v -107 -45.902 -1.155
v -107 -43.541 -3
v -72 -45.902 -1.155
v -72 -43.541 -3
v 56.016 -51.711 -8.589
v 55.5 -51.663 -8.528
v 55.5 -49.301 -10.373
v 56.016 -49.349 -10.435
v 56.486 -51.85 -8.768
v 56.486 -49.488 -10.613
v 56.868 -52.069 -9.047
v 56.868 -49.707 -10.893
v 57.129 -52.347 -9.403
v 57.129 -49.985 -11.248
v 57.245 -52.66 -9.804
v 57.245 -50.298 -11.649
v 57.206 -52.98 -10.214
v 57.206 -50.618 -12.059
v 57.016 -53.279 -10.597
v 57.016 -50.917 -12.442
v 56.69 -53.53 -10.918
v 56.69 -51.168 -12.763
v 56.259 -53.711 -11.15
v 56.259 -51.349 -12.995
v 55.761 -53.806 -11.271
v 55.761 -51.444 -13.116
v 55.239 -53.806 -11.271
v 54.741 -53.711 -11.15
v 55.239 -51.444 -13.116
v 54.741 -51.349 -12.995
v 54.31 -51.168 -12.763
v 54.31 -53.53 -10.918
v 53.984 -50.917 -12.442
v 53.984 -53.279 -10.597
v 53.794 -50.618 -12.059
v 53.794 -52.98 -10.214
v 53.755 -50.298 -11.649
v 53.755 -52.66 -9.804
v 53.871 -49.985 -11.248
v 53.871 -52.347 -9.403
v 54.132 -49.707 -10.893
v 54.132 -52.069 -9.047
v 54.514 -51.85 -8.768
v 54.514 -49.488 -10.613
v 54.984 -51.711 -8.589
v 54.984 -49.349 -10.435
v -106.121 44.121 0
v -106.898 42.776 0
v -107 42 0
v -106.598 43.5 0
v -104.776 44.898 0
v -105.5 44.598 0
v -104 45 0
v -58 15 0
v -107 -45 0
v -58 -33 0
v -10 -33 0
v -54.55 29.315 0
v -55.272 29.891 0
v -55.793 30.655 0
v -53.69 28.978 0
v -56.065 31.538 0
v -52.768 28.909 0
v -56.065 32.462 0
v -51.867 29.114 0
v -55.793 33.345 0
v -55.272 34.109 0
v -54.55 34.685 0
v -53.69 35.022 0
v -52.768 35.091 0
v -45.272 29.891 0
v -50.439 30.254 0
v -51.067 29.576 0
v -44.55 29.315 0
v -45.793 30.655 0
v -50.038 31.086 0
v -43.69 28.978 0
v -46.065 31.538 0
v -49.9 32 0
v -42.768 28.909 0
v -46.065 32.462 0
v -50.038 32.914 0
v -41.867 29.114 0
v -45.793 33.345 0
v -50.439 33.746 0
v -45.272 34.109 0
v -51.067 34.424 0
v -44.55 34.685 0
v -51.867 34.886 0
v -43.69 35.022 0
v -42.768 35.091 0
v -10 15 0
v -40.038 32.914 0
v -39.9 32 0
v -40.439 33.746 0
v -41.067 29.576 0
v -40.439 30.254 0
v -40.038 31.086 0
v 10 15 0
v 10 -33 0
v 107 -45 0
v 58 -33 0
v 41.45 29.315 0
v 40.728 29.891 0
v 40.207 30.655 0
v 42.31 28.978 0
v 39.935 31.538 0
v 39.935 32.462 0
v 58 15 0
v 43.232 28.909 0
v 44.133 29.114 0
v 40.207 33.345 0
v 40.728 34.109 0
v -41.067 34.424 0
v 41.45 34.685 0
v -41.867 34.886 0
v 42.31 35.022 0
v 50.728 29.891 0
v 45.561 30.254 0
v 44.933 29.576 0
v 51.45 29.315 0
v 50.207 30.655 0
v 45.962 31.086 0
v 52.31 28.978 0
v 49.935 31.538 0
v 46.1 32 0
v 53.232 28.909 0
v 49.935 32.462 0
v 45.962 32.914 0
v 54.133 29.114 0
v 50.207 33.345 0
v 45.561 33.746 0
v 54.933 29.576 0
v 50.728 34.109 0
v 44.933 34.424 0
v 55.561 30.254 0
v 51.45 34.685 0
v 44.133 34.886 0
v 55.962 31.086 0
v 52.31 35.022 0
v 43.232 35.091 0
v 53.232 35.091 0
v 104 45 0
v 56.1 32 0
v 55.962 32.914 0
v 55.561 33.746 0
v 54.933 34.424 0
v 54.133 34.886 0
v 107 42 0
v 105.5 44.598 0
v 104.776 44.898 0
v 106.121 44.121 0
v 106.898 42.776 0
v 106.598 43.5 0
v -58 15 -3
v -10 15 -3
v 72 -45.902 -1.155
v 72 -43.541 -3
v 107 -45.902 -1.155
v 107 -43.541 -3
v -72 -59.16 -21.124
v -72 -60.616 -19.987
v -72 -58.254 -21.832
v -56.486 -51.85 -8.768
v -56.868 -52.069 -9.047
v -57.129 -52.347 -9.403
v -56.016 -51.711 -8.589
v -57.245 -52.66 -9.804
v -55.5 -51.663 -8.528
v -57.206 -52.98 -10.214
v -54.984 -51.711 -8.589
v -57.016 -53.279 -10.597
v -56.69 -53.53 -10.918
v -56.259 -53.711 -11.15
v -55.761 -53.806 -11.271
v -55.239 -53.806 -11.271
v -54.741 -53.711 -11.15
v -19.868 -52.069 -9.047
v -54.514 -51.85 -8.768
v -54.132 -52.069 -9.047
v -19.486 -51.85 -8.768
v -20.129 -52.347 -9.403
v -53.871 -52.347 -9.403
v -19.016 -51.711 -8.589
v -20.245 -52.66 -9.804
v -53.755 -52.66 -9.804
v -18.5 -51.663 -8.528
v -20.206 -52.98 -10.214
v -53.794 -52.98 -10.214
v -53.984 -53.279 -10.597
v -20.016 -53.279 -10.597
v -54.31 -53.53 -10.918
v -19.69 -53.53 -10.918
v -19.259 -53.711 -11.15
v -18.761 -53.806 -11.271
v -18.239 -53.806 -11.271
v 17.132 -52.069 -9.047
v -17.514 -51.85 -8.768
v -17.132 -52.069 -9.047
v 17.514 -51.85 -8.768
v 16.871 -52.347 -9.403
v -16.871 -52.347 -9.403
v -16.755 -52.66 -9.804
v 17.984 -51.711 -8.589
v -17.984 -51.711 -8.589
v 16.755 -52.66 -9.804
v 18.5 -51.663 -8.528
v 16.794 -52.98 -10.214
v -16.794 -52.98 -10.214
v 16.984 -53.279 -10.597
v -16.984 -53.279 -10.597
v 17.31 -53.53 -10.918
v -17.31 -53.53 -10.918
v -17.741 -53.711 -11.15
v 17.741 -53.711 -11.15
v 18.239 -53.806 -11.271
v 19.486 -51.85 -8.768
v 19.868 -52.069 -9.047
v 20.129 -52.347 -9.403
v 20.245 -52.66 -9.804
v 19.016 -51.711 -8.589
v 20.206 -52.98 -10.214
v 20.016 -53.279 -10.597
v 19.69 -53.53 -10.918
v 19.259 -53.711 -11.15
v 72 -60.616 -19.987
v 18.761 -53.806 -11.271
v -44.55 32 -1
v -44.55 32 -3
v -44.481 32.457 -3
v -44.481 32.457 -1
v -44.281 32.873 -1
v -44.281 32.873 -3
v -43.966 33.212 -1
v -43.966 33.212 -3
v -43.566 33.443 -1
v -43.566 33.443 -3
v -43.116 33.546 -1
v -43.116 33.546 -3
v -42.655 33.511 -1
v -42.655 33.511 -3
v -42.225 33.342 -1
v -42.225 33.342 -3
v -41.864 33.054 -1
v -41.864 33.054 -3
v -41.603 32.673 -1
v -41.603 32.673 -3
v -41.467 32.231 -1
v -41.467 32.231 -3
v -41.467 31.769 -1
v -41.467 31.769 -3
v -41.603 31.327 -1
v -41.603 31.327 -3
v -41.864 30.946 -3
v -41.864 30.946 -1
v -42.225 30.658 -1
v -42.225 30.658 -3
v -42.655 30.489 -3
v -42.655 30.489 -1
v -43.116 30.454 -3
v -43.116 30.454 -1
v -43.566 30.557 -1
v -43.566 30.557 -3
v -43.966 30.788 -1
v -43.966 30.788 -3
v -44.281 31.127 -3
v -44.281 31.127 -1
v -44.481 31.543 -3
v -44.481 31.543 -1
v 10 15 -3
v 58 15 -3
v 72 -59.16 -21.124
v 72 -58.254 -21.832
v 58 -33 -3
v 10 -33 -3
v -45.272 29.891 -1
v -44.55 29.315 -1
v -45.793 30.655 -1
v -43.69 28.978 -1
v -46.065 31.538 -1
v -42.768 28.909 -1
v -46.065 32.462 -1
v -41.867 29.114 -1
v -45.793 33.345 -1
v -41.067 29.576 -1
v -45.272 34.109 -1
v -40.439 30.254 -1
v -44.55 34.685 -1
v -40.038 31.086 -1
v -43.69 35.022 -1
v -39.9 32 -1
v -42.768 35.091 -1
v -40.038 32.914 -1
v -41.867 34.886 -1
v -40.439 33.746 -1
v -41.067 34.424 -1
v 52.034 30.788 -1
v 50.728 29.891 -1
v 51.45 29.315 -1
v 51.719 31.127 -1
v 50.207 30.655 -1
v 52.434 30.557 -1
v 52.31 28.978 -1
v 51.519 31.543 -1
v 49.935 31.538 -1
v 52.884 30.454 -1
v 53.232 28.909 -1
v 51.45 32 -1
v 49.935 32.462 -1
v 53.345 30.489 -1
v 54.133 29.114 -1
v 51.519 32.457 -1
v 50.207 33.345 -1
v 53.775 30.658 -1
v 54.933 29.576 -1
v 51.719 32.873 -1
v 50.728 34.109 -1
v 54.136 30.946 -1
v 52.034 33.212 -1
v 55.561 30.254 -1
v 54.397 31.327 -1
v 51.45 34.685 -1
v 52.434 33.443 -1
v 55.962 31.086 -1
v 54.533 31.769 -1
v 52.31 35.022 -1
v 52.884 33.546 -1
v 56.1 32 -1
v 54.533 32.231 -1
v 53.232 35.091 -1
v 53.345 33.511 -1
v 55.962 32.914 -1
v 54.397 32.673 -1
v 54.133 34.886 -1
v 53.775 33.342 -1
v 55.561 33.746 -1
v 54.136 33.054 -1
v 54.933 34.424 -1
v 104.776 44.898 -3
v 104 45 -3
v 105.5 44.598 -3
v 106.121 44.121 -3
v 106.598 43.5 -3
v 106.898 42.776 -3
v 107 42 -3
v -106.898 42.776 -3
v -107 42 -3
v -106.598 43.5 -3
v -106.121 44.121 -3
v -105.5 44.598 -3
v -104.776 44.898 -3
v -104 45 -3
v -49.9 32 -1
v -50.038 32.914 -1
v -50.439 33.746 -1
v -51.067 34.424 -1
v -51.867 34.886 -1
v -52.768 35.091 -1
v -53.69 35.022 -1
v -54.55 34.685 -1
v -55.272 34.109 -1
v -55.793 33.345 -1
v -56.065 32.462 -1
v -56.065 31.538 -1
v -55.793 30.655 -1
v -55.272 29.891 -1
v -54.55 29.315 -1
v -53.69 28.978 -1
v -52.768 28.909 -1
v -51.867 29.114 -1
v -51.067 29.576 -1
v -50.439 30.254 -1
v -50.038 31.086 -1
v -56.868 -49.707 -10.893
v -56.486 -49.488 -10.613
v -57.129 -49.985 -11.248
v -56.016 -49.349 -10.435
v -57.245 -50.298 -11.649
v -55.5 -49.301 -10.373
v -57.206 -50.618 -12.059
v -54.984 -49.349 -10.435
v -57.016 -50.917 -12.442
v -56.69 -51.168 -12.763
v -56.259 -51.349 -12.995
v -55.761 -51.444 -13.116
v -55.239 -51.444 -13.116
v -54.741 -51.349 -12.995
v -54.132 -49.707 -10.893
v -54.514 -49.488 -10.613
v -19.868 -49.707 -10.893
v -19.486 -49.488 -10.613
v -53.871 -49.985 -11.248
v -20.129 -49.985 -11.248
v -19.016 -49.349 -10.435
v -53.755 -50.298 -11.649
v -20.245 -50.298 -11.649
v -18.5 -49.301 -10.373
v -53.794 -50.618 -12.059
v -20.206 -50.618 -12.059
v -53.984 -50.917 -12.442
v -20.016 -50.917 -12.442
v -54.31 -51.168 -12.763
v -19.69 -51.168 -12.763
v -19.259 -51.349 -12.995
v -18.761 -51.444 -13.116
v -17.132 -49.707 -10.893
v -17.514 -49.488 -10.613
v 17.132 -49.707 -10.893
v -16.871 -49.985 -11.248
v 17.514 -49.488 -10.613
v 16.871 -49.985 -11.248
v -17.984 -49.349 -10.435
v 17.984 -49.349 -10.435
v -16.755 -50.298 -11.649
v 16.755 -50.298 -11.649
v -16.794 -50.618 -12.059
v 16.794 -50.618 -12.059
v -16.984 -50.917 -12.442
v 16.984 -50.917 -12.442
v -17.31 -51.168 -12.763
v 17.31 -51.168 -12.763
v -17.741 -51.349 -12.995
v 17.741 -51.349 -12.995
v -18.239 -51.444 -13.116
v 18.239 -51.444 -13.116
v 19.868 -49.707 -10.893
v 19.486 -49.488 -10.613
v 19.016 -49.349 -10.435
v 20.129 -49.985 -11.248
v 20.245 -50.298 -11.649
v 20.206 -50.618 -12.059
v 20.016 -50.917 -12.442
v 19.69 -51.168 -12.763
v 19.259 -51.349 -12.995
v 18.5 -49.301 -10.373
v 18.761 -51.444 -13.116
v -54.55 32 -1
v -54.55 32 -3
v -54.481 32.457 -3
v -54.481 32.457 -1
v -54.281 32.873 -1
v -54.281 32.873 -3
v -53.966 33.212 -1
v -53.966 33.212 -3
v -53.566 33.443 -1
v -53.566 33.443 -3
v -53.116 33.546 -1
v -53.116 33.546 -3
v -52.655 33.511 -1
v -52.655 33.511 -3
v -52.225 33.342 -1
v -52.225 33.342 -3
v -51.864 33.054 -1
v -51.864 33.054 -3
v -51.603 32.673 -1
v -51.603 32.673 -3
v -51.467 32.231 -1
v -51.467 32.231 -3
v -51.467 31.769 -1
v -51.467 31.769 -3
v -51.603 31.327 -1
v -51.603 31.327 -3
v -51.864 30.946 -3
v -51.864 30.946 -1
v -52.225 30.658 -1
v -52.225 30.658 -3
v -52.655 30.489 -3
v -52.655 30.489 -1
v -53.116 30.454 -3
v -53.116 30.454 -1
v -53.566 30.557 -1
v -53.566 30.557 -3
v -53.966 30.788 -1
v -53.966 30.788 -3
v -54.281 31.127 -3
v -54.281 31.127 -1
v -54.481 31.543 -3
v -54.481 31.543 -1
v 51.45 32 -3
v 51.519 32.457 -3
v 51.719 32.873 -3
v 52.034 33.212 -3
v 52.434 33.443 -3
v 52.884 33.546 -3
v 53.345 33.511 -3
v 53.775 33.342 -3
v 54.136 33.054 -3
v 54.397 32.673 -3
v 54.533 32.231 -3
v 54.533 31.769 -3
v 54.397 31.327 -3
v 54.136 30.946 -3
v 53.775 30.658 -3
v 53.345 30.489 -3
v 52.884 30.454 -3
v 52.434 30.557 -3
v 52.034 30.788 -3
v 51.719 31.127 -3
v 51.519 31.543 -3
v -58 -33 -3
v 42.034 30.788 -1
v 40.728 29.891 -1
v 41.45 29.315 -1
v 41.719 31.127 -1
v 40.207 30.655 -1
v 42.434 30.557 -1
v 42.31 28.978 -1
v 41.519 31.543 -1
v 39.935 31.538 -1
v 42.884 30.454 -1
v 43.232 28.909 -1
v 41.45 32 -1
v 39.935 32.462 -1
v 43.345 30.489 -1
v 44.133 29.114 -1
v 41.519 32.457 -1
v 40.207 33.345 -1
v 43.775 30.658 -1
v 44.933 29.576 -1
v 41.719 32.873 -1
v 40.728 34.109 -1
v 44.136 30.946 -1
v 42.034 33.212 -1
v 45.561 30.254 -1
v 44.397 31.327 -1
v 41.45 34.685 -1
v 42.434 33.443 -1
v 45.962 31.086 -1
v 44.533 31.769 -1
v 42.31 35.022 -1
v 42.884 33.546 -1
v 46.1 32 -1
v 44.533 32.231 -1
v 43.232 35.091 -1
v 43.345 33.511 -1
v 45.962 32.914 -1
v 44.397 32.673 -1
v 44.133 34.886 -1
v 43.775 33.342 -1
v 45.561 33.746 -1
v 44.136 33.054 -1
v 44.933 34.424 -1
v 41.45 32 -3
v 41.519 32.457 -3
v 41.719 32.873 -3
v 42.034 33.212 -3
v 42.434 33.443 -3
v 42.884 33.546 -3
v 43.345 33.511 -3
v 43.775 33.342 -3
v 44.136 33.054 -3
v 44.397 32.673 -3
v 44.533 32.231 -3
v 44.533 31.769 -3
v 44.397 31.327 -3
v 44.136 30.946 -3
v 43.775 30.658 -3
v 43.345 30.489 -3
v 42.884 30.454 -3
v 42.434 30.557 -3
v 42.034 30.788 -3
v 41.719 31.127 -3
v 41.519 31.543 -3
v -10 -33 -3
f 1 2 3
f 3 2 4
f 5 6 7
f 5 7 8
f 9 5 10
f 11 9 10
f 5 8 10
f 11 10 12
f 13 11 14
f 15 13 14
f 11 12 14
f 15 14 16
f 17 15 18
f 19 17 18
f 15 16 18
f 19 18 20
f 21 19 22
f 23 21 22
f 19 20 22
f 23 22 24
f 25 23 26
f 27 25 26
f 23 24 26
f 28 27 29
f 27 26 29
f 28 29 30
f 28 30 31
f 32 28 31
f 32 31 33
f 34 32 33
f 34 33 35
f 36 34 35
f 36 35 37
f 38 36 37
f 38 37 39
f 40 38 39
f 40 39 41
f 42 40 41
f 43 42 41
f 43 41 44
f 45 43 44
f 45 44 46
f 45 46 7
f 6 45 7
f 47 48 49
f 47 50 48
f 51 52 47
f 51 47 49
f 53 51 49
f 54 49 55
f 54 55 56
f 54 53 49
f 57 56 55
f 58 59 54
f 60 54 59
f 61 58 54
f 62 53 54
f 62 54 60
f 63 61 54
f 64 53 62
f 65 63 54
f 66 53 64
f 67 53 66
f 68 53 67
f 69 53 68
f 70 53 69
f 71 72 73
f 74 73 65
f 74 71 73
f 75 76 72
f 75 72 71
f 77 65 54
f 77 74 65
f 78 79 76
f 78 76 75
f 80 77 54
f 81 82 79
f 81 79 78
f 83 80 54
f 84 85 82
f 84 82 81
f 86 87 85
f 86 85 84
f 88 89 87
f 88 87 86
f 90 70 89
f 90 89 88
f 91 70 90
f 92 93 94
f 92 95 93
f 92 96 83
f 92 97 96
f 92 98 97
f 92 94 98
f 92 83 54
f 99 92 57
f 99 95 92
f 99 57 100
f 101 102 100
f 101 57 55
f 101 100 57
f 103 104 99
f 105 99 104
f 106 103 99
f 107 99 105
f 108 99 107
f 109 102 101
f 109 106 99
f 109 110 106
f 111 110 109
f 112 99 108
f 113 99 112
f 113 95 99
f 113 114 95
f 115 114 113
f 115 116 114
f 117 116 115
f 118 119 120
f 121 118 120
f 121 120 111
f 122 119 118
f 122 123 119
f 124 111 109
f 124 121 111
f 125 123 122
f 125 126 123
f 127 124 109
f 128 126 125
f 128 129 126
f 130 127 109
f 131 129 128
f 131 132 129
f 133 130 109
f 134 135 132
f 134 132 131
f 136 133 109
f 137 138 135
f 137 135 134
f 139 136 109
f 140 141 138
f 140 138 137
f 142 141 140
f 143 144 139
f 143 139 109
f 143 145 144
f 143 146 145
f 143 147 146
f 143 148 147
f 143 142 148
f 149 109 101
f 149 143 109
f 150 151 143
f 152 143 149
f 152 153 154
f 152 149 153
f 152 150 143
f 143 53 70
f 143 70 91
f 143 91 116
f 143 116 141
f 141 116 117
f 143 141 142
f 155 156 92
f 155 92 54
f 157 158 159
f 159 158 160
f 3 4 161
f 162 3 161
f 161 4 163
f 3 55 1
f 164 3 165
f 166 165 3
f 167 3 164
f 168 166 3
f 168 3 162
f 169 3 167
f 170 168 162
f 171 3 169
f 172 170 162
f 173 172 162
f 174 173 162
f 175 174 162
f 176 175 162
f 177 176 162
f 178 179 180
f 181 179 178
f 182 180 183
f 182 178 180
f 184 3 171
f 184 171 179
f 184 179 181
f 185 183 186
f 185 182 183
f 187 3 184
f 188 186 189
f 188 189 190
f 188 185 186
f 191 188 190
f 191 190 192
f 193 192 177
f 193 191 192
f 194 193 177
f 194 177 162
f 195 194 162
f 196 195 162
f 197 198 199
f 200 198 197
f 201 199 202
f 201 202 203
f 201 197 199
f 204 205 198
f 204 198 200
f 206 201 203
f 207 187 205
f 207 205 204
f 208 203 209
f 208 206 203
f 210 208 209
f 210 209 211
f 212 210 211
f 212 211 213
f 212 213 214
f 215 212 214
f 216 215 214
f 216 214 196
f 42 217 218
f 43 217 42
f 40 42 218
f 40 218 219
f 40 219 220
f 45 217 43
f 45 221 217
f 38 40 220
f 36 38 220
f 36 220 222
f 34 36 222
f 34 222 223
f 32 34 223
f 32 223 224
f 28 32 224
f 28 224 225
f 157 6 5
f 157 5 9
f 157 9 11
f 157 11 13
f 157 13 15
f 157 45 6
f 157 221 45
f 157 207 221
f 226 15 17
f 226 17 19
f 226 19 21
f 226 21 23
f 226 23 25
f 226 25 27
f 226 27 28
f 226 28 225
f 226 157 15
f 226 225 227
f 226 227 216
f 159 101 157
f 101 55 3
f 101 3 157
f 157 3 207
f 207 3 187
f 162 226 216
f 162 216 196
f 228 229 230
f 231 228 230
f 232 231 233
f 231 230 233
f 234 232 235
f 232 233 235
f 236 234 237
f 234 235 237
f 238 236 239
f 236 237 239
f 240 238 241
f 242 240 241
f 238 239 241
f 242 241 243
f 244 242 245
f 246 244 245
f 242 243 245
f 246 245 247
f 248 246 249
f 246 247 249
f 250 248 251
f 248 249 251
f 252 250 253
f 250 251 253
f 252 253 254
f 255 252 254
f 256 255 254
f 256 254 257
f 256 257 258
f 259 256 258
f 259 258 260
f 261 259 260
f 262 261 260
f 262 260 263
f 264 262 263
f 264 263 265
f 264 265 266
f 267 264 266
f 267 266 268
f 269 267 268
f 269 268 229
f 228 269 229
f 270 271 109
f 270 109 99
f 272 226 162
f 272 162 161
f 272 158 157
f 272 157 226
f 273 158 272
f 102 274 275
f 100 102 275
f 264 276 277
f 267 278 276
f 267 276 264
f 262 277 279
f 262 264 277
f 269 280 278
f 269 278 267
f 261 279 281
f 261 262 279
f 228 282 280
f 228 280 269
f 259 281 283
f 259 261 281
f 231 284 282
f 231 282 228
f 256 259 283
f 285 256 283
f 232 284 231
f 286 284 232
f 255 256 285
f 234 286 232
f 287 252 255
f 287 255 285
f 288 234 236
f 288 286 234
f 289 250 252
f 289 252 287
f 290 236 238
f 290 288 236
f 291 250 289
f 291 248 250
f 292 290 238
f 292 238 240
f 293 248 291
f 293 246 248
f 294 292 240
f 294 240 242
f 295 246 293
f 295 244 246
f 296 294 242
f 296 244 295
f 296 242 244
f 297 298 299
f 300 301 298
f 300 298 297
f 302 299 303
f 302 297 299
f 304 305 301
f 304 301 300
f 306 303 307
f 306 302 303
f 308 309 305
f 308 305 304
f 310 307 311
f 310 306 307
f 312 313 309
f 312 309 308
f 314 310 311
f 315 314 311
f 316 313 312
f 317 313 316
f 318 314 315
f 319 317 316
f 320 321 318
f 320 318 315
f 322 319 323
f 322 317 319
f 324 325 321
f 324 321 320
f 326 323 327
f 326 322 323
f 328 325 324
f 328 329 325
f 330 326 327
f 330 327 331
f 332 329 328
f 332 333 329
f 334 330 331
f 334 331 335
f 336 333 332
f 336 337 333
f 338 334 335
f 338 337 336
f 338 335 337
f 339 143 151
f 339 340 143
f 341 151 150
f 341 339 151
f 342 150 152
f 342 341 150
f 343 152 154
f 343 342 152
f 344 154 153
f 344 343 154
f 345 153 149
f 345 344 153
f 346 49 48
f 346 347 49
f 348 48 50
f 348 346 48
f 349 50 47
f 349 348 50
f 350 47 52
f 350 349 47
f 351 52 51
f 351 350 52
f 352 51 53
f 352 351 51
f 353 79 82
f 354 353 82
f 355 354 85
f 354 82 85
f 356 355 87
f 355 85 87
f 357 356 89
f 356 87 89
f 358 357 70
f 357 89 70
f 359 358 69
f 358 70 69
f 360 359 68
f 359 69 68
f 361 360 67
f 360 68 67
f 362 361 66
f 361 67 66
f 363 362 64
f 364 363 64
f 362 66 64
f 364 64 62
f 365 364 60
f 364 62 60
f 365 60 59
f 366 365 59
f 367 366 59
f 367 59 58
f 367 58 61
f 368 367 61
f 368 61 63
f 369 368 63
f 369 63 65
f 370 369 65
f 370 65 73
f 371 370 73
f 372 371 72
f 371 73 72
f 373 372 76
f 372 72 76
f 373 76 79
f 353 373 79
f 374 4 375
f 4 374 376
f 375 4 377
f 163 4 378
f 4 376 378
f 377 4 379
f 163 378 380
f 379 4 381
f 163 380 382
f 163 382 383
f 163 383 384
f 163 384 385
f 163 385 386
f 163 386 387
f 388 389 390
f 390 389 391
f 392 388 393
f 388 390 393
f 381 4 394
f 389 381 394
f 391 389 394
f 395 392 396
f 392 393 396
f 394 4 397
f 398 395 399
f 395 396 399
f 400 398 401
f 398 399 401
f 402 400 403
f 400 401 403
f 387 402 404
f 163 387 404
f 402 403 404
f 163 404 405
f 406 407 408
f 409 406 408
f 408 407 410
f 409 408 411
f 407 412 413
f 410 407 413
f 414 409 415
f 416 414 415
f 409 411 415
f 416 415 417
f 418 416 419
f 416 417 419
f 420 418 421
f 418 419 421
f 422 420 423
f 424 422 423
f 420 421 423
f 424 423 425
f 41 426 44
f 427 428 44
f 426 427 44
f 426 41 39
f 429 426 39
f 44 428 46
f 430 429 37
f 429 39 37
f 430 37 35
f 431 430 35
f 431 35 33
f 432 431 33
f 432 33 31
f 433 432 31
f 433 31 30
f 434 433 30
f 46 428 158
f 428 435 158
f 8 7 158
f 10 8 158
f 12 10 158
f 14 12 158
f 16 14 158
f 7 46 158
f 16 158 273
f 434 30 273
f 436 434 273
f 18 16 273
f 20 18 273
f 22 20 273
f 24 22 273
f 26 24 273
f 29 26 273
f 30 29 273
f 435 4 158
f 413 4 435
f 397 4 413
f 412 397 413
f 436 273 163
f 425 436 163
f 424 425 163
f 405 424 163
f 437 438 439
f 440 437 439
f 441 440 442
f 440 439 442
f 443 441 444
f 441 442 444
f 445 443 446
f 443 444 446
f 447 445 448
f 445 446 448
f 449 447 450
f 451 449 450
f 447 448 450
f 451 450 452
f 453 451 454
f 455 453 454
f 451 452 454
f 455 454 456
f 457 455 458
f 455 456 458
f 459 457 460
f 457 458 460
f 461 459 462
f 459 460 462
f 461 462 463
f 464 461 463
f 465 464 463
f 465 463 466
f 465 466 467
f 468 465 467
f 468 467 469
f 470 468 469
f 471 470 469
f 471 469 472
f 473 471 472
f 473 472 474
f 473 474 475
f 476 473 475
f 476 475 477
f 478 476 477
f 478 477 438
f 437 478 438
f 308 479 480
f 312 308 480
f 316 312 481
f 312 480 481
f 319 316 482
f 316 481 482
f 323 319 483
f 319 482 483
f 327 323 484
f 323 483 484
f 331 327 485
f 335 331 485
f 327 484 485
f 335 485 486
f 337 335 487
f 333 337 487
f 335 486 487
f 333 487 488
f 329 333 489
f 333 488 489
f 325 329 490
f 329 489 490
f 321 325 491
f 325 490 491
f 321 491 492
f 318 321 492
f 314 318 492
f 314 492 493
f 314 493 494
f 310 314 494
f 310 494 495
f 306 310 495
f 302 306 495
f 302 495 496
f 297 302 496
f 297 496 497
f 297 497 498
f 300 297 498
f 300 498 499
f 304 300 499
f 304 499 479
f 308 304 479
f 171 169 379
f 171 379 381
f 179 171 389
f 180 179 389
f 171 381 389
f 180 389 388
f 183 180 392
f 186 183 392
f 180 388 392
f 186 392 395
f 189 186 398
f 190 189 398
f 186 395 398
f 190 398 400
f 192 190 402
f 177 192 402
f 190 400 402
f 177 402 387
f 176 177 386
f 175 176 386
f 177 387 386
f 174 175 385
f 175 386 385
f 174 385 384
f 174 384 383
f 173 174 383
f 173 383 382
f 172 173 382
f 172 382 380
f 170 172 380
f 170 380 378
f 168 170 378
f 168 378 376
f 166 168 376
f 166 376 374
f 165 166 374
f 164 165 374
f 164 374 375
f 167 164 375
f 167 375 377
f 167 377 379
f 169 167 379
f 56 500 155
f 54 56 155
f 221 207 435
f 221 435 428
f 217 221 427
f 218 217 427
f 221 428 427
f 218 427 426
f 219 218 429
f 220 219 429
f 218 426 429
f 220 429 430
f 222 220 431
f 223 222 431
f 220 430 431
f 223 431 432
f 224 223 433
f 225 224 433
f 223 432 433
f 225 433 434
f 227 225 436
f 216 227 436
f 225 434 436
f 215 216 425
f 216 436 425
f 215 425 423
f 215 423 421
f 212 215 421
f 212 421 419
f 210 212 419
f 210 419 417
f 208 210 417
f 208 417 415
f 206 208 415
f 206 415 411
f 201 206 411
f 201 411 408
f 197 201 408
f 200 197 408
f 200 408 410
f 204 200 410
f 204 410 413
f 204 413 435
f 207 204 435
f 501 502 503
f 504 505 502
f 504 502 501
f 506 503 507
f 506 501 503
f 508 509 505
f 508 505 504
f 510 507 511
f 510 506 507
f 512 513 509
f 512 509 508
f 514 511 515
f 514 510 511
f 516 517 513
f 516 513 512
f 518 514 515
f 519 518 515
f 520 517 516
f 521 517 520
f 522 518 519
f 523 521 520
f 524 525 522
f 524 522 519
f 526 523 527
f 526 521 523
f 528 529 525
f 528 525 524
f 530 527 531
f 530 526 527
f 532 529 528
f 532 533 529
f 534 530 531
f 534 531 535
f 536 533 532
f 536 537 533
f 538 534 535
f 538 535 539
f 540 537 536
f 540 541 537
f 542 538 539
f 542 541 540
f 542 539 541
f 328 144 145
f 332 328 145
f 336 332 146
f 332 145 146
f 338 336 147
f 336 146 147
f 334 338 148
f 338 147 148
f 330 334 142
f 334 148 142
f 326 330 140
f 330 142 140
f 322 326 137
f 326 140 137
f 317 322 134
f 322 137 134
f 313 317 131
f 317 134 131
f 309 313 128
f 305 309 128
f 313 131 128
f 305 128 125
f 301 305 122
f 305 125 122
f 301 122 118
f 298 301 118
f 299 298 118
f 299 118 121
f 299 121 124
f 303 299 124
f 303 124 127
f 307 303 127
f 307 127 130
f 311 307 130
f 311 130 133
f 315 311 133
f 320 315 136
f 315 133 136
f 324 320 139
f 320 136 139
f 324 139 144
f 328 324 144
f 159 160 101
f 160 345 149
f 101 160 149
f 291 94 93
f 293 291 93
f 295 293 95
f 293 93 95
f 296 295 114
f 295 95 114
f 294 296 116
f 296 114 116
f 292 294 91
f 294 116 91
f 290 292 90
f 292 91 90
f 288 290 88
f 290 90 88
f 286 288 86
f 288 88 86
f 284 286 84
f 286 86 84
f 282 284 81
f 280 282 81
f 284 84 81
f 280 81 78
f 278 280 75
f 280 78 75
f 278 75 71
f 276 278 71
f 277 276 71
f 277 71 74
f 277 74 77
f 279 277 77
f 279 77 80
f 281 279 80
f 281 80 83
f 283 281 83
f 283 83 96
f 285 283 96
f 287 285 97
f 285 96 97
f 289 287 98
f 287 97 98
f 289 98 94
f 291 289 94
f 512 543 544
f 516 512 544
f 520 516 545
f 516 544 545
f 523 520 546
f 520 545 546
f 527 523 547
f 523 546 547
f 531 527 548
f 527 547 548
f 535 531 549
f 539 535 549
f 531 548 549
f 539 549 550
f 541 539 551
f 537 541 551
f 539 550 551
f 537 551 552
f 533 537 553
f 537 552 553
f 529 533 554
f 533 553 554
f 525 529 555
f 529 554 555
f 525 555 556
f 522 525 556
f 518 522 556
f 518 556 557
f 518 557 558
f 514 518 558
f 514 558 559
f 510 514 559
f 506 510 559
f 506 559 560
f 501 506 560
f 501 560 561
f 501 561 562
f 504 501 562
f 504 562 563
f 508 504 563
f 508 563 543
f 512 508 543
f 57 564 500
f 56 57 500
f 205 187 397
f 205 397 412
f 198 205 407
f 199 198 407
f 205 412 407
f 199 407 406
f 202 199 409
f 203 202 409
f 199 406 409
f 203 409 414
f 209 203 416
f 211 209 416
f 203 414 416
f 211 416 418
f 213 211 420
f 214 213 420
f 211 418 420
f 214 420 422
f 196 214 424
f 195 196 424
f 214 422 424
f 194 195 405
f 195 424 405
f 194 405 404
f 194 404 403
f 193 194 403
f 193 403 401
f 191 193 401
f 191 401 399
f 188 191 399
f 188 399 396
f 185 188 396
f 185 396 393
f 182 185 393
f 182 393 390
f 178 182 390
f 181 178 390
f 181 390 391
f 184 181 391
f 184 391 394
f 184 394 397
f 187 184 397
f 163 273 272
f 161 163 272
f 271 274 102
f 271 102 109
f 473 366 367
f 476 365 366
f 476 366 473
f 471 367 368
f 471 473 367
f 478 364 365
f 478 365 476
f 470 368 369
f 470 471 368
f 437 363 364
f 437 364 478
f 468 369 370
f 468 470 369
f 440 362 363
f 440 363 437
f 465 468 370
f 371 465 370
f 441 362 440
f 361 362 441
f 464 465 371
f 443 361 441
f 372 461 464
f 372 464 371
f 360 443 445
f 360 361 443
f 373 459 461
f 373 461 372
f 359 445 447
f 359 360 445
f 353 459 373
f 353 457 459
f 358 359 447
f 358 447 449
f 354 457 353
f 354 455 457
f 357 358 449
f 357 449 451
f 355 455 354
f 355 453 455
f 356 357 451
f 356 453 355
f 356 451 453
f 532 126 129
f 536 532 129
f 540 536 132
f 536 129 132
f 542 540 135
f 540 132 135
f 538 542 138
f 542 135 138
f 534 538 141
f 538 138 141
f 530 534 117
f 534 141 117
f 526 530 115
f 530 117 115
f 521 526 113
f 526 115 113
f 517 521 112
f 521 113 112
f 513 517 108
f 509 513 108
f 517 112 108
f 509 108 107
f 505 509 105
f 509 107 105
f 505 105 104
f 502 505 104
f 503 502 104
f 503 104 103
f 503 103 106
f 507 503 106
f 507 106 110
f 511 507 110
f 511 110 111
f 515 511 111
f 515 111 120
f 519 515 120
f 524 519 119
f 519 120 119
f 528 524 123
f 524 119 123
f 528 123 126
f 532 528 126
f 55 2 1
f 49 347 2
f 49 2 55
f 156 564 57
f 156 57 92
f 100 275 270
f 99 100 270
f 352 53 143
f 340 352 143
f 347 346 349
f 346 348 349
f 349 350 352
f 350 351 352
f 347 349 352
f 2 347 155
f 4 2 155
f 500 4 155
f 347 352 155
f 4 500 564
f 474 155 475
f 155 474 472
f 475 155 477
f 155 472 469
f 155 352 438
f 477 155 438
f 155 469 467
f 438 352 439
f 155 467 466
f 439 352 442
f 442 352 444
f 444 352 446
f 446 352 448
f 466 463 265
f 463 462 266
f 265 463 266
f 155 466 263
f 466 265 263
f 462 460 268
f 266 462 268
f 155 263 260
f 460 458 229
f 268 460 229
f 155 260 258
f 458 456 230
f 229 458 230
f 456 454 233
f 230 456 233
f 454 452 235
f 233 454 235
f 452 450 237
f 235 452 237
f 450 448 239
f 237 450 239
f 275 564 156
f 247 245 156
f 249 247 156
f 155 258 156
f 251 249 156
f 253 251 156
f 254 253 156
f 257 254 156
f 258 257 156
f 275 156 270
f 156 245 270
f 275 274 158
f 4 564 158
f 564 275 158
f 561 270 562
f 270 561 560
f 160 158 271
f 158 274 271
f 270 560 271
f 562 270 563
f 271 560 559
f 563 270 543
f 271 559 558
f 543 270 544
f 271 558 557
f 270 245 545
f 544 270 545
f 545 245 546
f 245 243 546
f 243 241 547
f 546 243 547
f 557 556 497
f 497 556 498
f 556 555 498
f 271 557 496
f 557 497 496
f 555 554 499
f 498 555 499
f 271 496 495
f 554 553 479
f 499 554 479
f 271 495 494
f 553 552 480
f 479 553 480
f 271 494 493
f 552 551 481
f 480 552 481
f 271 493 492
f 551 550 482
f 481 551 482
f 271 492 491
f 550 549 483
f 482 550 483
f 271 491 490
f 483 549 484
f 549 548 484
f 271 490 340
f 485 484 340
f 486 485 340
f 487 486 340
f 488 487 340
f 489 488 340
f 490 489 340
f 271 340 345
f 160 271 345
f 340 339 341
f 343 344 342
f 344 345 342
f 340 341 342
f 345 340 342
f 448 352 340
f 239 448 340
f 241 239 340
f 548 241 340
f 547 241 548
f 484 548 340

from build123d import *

# Parameters (mm, degrees)
SKETCH_2_W           = 214
SKETCH_2_H           = 90
EXTRUDE_5_DEPTH      = 3
SKETCH_14_R          = 1.55
CUT_EXTRUDE_12_DEPTH = 117.116320989
SKETCH_15_R          = 3.1
CUT_EXTRUDE_14_DEPTH = 1
SKETCH_11_W          = 48
SKETCH_11_H          = 48
CUT_EXTRUDE_15_DEPTH = 117.116320989
EXTRUDE_6_DEPTH      = 214
EXTRUDE_7_DEPTH      = 214
SKETCH_13_R          = 1.75
CUT_EXTRUDE_16_DEPTH = 134.72337904
SKETCH_23_W          = 35
SKETCH_23_H          = 23.89847847
CUT_EXTRUDE_17_DEPTH = 135.831639748
FILLET_3_R           = 3
FILLET_4_R           = 3


with BuildPart() as part:
    # 草图2 → 凸台-拉伸5 (new body)
    with BuildSketch(Plane.XY):
        Rectangle(SKETCH_2_W, SKETCH_2_H)
    extrude(amount=-EXTRUDE_5_DEPTH)

    # 草图14 → 切除-拉伸12 (cut, through all)
    with BuildSketch(Plane(origin=(0, 0, -3), x_dir=(-1, 0, 0), z_dir=(0, 0, -1))):
        with Locations((-53, 32)):
            Circle(SKETCH_14_R)
        with Locations((-43, 32)):
            Circle(SKETCH_14_R)
        with Locations((43, 32)):
            Circle(SKETCH_14_R)
        with Locations((53, 32)):
            Circle(SKETCH_14_R)
    extrude(amount=-CUT_EXTRUDE_12_DEPTH, mode=Mode.SUBTRACT)

    # 草图15 → 切除-拉伸14 (cut)
    with BuildSketch(Plane.XY):
        with Locations((53, 32)):
            Circle(SKETCH_15_R)
        with Locations((43, 32)):
            Circle(SKETCH_15_R)
        with Locations((-43, 32)):
            Circle(SKETCH_15_R)
        with Locations((-53, 32)):
            Circle(SKETCH_15_R)
    extrude(amount=-CUT_EXTRUDE_14_DEPTH, mode=Mode.SUBTRACT)

    # 草图11 → 切除-拉伸15 (cut, through all)
    with BuildSketch(Plane(origin=(0, 0, -3), x_dir=(-1, 0, 0), z_dir=(0, 0, -1))):
        with Locations((-34, -9)):
            Rectangle(SKETCH_11_W, SKETCH_11_H)
        with Locations((34, -9)):
            Rectangle(SKETCH_11_W, SKETCH_11_H)
    extrude(amount=-CUT_EXTRUDE_15_DEPTH, mode=Mode.SUBTRACT)

    # 草图21 → 凸台-拉伸6 (add, through all)
    with BuildSketch(Plane(origin=(107, 0, 0), x_dir=(0, 0, -1), z_dir=(1, 0, 0))):
        Polygon((0, -45), (19.987130176, -60.615657522), (21.124247333, -59.160213932), (3, -45), align=None)
    extrude(amount=-EXTRUDE_6_DEPTH)

    # 草图22 → 凸台-拉伸7 (add, through all)
    with BuildSketch(Plane(origin=(107, 0, 0), x_dir=(0, 0, -1), z_dir=(1, 0, 0))):
        Polygon((3, -43.540629053), (21.83225803, -58.254001566), (21.124247333, -59.160213932), (3, -45), align=None)
    extrude(amount=-EXTRUDE_7_DEPTH)

    # 草图13 → 切除-拉伸16 (cut, through all)
    with BuildSketch(Plane(origin=(0, -24.123766801, 18.847552259), x_dir=(1, 0, 0), z_dir=(0, 0.788010753606719, -0.615661475325662))):
        with Locations(Location((55.5, 40.277161152, 0), (0, 0, 270))):
            Circle(SKETCH_13_R)
        with Locations(Location((18.5, 40.277161152, 0), (0, 0, 270))):
            Circle(SKETCH_13_R)
        with Locations(Location((-18.5, 40.277161152, 0), (0, 0, 270))):
            Circle(SKETCH_13_R)
        with Locations(Location((-55.5, 40.277161152, 0), (0, 0, 270))):
            Circle(SKETCH_13_R)
    extrude(amount=-CUT_EXTRUDE_16_DEPTH, mode=Mode.SUBTRACT)

    # 草图23 → 切除-拉伸17 (cut, through all)
    with BuildSketch(Plane(origin=(0, -25.581586695, 19.986525988), x_dir=(1, 0, 0), z_dir=(0, 0.788010753606719, -0.6156614753256621))):
        with Locations((-89.5, 41.119559415)):
            Rectangle(SKETCH_23_W, SKETCH_23_H)
        with Locations((89.5, 41.119559415)):
            Rectangle(SKETCH_23_W, SKETCH_23_H)
    extrude(amount=-CUT_EXTRUDE_17_DEPTH, mode=Mode.SUBTRACT)

    # 圆角3
    fillet_3_edges = [part.edges().sort_by_distance(p)[0] for p in [
        (-107, 45, -1.5),
    ]]
    fillet(fillet_3_edges, radius=FILLET_3_R)

    # 圆角4
    fillet_4_edges = [part.edges().sort_by_distance(p)[0] for p in [
        (107, 45, -1.5),
    ]]
    fillet(fillet_4_edges, radius=FILLET_4_R)


solid = part.part
